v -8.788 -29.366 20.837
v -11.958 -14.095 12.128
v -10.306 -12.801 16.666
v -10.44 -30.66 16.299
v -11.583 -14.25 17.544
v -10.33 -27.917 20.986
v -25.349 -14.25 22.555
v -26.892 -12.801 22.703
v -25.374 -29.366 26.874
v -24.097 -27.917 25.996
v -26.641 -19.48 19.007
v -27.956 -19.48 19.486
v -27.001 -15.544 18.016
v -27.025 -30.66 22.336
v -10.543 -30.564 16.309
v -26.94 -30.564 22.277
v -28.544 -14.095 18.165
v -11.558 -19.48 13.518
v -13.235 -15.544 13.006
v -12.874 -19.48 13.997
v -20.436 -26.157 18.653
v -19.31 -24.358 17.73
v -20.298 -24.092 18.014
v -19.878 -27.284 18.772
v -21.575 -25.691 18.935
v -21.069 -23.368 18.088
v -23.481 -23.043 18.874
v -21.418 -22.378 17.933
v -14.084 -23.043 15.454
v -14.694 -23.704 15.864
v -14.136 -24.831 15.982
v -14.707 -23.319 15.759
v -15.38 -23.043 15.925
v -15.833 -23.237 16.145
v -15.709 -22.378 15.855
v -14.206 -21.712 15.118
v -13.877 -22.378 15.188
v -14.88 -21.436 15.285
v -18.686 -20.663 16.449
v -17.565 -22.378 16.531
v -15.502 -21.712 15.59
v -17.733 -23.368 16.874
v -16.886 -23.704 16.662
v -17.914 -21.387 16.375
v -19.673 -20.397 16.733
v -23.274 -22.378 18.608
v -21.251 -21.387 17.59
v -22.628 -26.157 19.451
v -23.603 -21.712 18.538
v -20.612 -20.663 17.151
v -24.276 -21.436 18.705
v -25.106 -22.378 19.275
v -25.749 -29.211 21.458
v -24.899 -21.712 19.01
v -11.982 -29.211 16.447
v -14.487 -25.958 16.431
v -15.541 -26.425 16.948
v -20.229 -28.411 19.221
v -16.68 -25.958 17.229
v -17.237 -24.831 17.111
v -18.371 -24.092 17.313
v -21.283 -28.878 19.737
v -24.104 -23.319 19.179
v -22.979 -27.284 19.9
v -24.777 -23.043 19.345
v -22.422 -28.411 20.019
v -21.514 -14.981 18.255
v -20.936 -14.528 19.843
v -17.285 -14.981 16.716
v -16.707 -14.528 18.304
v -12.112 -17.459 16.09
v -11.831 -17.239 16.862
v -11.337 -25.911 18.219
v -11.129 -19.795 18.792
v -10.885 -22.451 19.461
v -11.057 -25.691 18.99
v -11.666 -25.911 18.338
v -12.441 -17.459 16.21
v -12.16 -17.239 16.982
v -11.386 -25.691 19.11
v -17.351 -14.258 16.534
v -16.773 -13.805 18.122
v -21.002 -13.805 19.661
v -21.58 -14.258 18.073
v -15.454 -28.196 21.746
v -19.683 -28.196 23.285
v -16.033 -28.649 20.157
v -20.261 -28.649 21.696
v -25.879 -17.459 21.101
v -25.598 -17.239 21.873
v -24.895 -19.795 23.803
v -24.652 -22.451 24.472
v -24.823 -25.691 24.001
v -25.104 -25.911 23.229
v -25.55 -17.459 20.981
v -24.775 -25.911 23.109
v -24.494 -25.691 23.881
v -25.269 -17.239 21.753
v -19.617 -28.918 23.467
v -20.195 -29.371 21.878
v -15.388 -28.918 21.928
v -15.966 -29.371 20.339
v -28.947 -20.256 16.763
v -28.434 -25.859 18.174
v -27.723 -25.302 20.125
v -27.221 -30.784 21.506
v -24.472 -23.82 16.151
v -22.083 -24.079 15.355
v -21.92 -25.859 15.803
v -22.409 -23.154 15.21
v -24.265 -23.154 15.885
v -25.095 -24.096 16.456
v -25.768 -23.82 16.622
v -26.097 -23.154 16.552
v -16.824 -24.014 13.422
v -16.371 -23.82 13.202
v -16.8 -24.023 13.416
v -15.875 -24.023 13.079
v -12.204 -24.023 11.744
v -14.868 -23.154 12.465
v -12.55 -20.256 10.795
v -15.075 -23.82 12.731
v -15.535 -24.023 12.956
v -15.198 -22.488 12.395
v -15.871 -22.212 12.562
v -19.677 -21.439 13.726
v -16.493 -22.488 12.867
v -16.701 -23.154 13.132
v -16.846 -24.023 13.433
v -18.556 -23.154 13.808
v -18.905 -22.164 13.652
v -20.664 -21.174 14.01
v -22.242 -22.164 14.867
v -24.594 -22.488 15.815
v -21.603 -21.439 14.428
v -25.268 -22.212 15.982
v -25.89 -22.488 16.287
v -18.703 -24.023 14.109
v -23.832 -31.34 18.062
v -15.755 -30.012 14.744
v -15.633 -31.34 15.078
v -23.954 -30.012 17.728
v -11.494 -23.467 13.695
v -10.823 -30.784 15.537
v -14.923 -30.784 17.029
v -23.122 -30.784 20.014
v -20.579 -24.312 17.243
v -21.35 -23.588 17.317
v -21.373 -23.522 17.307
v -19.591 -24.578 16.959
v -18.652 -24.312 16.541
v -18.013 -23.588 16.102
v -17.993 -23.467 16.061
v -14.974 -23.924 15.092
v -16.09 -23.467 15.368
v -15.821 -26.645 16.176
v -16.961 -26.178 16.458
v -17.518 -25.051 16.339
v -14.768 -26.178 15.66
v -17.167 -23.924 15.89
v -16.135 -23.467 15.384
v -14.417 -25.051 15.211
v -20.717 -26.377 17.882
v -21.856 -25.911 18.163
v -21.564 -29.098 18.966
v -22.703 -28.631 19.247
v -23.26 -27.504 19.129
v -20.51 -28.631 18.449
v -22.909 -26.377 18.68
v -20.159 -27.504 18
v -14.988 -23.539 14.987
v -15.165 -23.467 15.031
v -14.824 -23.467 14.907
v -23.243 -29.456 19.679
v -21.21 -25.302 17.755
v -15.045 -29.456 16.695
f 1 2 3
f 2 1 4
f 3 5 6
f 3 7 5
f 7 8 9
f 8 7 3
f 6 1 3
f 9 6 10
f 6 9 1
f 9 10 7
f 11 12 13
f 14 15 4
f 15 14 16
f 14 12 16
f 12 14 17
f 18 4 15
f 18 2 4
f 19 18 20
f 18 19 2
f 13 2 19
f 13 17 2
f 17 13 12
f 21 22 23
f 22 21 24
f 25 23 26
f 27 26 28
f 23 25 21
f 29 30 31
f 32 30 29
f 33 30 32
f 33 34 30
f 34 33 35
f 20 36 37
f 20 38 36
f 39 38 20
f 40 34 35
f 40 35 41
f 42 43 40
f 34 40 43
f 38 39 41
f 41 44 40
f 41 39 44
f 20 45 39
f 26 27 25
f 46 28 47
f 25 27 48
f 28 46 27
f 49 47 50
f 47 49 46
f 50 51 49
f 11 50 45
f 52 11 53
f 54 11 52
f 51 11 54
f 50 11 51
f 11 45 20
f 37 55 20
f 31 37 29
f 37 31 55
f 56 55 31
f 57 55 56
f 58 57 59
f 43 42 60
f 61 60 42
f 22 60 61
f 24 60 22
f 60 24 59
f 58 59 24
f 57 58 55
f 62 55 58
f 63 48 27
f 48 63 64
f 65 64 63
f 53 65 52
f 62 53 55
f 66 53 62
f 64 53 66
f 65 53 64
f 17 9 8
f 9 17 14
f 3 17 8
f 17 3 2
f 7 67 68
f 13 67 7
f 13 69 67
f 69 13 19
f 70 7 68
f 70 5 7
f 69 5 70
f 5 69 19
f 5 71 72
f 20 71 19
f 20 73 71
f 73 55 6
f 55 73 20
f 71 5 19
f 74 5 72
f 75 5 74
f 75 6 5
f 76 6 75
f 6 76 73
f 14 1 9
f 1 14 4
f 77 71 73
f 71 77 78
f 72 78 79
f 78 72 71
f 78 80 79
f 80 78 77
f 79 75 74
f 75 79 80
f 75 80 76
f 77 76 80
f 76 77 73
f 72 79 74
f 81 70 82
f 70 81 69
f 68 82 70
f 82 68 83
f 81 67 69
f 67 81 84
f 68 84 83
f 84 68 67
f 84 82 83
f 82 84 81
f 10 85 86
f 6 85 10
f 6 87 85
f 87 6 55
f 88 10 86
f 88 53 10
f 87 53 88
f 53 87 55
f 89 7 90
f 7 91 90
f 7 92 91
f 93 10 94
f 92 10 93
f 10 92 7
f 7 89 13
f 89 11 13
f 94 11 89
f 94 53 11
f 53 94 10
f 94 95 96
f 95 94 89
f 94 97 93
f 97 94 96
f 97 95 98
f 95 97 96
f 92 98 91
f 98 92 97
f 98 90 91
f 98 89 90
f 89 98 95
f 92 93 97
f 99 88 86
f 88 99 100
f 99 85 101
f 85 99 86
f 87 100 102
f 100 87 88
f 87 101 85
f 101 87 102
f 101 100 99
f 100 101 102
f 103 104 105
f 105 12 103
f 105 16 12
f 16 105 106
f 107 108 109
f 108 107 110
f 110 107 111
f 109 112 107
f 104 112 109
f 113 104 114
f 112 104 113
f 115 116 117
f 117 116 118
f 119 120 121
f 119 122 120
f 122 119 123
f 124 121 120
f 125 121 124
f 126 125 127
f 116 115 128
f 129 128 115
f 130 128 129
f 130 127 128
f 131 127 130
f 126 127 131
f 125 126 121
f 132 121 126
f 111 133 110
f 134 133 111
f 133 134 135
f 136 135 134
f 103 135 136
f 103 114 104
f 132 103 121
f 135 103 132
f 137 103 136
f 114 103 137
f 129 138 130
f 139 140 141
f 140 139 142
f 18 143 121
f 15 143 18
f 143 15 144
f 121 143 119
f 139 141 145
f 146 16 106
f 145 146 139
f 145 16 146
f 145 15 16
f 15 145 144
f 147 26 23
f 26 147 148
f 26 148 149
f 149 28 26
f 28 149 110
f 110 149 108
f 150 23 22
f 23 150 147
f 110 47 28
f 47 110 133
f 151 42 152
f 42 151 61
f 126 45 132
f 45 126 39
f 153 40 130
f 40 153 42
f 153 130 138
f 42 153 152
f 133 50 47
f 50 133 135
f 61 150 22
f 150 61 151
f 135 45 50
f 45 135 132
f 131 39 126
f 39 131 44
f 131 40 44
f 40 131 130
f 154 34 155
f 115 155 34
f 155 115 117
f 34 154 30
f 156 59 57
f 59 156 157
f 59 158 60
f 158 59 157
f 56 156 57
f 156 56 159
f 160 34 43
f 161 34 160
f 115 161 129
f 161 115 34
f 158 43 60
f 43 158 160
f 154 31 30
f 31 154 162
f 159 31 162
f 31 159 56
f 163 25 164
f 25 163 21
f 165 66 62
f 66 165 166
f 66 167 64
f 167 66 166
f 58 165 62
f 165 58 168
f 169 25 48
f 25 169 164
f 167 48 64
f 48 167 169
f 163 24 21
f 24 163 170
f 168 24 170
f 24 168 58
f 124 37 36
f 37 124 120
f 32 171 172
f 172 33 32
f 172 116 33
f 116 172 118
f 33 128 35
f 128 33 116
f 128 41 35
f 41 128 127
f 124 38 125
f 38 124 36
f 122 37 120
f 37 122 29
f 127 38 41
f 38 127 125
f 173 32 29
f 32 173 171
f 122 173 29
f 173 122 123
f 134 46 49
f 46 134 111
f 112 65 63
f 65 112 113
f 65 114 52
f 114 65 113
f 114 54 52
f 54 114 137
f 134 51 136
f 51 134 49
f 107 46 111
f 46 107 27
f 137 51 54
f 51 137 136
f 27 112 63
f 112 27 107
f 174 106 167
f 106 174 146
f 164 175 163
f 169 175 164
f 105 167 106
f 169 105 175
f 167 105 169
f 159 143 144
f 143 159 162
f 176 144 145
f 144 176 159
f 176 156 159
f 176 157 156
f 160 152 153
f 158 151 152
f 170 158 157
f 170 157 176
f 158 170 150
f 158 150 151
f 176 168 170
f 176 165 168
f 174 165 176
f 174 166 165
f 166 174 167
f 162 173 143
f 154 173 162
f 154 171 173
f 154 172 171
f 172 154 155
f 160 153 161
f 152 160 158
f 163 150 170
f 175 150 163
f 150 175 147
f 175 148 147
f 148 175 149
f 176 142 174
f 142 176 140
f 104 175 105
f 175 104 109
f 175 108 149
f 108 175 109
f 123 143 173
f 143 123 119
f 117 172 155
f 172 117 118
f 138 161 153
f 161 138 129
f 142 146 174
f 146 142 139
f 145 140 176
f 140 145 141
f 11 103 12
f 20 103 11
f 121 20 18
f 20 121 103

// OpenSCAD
difference () {
  union () {
    translate ([0, 0, 8]) {
      rotate (a=14.999999999999998, v=[0, 1, 0]) {
        translate ([0, 0, 0]) {
          translate ([0, 0, 246.38271661988213]) {
            rotate (a=5.0, v=[0, 1, 0]) {
              translate ([0, 0, -246.38271661988213]) {
                translate ([0, 0, 86.460145740475]) {
                  rotate (a=-14.999999999999998, v=[1, 0, 0]) {
                    translate ([0, 0, -86.460145740475]) {
                      difference () {
                        union () {
                          difference () {
                            union () {
                              translate ([0, 7.825, 5/2]) {
                                cube ([17.65, 1.5, 5], center=true);
                              }
                              translate ([8.075, 0, 5/2]) {
                                cube ([1.5, 17.15, 5], center=true);
                              }
                              hull () {
                                translate ([8.075, 0, 4.347826086956522]) {
                                  cube ([1.5, 2.75, 1], center=true);
                                }
                                translate ([7.325, 0, 3.1]) {
                                  rotate (a=90.0, v=[1, 0, 0]) {
                                    cube ([0.7, 0.85, 8.75], center=true);
                                  }
                                }
                              }
                            }
                            translate ([0, 7.4481343283582095, 3.05]) {
                              cube ([4.5, 0.75, 1.75], center=true);
                            }
                          }
                          mirror ([0, 1, 0]) {
                            mirror ([1, 0, 0]) {
                              difference () {
                                union () {
                                  translate ([0, 7.825, 5/2]) {
                                    cube ([17.65, 1.5, 5], center=true);
                                  }
                                  translate ([8.075, 0, 5/2]) {
                                    cube ([1.5, 17.15, 5], center=true);
                                  }
                                  hull () {
                                    translate ([8.075, 0, 4.347826086956522]) {
                                      cube ([1.5, 2.75, 1], center=true);
                                    }
                                    translate ([7.325, 0, 3.1]) {
                                      rotate (a=90.0, v=[1, 0, 0]) {
                                        cube ([0.7, 0.85, 8.75], center=true);
                                      }
                                    }
                                  }
                                }
                                translate ([0, 7.4481343283582095, 3.05]) {
                                  cube ([4.5, 0.75, 1.75], center=true);
                                }
                              }
                            }
                          }
                          mirror ([0, 1, 0]) {
                            mirror ([1, 0, 0]) {
                              difference () {
                                translate ([0, 0.0, -3/2]) {
                                  cube ([17.45, 16.95, 3], center=true);
                                }
                                cylinder ($fn=12, h=10, r=2.05, center=true);
                                translate ([-3.81, 2.54, 0]) {
                                  cylinder ($fn=8, h=10, r=1.65, center=true);
                                }
                                translate ([2.54, 5.08, 0]) {
                                  cylinder ($fn=8, h=10, r=1.65, center=true);
                                }
                                translate ([-5, 0, 0]) {
                                  cylinder ($fn=8, h=10, r=0.975, center=true);
                                }
                                translate ([5, 0, 0]) {
                                  cylinder ($fn=8, h=10, r=0.975, center=true);
                                }
                                translate ([0.01, 4.95, -2.6]) {
                                  cube ([17.45, 4.3, 3.5], center=true);
                                }
                                translate ([-3.8777777777777778, 4, -2.6]) {
                                  cube ([11.3425, 6.2, 3.5], center=true);
                                }
                                translate ([6.543749999999999, 8.475, -2.6]) {
                                  cube ([4.3625, 4.3, 3.5], center=true);
                                }
                                translate ([-6.543749999999999, 8.475, -2.6]) {
                                  cube ([4.3625, 4.3, 3.5], center=true);
                                }
                                translate ([0, -6, -2.6]) {
                                  cube ([17.45, 6, 10], center=true);
                                }
                              }
                            }
                          }
                        }
                      }
                    }
                  }
                }
              }
            }
          }
        }
      }
    }
  }
  translate ([0, 0, -20]) {
    cube ([350, 350, 40], center=true);
  }
}
